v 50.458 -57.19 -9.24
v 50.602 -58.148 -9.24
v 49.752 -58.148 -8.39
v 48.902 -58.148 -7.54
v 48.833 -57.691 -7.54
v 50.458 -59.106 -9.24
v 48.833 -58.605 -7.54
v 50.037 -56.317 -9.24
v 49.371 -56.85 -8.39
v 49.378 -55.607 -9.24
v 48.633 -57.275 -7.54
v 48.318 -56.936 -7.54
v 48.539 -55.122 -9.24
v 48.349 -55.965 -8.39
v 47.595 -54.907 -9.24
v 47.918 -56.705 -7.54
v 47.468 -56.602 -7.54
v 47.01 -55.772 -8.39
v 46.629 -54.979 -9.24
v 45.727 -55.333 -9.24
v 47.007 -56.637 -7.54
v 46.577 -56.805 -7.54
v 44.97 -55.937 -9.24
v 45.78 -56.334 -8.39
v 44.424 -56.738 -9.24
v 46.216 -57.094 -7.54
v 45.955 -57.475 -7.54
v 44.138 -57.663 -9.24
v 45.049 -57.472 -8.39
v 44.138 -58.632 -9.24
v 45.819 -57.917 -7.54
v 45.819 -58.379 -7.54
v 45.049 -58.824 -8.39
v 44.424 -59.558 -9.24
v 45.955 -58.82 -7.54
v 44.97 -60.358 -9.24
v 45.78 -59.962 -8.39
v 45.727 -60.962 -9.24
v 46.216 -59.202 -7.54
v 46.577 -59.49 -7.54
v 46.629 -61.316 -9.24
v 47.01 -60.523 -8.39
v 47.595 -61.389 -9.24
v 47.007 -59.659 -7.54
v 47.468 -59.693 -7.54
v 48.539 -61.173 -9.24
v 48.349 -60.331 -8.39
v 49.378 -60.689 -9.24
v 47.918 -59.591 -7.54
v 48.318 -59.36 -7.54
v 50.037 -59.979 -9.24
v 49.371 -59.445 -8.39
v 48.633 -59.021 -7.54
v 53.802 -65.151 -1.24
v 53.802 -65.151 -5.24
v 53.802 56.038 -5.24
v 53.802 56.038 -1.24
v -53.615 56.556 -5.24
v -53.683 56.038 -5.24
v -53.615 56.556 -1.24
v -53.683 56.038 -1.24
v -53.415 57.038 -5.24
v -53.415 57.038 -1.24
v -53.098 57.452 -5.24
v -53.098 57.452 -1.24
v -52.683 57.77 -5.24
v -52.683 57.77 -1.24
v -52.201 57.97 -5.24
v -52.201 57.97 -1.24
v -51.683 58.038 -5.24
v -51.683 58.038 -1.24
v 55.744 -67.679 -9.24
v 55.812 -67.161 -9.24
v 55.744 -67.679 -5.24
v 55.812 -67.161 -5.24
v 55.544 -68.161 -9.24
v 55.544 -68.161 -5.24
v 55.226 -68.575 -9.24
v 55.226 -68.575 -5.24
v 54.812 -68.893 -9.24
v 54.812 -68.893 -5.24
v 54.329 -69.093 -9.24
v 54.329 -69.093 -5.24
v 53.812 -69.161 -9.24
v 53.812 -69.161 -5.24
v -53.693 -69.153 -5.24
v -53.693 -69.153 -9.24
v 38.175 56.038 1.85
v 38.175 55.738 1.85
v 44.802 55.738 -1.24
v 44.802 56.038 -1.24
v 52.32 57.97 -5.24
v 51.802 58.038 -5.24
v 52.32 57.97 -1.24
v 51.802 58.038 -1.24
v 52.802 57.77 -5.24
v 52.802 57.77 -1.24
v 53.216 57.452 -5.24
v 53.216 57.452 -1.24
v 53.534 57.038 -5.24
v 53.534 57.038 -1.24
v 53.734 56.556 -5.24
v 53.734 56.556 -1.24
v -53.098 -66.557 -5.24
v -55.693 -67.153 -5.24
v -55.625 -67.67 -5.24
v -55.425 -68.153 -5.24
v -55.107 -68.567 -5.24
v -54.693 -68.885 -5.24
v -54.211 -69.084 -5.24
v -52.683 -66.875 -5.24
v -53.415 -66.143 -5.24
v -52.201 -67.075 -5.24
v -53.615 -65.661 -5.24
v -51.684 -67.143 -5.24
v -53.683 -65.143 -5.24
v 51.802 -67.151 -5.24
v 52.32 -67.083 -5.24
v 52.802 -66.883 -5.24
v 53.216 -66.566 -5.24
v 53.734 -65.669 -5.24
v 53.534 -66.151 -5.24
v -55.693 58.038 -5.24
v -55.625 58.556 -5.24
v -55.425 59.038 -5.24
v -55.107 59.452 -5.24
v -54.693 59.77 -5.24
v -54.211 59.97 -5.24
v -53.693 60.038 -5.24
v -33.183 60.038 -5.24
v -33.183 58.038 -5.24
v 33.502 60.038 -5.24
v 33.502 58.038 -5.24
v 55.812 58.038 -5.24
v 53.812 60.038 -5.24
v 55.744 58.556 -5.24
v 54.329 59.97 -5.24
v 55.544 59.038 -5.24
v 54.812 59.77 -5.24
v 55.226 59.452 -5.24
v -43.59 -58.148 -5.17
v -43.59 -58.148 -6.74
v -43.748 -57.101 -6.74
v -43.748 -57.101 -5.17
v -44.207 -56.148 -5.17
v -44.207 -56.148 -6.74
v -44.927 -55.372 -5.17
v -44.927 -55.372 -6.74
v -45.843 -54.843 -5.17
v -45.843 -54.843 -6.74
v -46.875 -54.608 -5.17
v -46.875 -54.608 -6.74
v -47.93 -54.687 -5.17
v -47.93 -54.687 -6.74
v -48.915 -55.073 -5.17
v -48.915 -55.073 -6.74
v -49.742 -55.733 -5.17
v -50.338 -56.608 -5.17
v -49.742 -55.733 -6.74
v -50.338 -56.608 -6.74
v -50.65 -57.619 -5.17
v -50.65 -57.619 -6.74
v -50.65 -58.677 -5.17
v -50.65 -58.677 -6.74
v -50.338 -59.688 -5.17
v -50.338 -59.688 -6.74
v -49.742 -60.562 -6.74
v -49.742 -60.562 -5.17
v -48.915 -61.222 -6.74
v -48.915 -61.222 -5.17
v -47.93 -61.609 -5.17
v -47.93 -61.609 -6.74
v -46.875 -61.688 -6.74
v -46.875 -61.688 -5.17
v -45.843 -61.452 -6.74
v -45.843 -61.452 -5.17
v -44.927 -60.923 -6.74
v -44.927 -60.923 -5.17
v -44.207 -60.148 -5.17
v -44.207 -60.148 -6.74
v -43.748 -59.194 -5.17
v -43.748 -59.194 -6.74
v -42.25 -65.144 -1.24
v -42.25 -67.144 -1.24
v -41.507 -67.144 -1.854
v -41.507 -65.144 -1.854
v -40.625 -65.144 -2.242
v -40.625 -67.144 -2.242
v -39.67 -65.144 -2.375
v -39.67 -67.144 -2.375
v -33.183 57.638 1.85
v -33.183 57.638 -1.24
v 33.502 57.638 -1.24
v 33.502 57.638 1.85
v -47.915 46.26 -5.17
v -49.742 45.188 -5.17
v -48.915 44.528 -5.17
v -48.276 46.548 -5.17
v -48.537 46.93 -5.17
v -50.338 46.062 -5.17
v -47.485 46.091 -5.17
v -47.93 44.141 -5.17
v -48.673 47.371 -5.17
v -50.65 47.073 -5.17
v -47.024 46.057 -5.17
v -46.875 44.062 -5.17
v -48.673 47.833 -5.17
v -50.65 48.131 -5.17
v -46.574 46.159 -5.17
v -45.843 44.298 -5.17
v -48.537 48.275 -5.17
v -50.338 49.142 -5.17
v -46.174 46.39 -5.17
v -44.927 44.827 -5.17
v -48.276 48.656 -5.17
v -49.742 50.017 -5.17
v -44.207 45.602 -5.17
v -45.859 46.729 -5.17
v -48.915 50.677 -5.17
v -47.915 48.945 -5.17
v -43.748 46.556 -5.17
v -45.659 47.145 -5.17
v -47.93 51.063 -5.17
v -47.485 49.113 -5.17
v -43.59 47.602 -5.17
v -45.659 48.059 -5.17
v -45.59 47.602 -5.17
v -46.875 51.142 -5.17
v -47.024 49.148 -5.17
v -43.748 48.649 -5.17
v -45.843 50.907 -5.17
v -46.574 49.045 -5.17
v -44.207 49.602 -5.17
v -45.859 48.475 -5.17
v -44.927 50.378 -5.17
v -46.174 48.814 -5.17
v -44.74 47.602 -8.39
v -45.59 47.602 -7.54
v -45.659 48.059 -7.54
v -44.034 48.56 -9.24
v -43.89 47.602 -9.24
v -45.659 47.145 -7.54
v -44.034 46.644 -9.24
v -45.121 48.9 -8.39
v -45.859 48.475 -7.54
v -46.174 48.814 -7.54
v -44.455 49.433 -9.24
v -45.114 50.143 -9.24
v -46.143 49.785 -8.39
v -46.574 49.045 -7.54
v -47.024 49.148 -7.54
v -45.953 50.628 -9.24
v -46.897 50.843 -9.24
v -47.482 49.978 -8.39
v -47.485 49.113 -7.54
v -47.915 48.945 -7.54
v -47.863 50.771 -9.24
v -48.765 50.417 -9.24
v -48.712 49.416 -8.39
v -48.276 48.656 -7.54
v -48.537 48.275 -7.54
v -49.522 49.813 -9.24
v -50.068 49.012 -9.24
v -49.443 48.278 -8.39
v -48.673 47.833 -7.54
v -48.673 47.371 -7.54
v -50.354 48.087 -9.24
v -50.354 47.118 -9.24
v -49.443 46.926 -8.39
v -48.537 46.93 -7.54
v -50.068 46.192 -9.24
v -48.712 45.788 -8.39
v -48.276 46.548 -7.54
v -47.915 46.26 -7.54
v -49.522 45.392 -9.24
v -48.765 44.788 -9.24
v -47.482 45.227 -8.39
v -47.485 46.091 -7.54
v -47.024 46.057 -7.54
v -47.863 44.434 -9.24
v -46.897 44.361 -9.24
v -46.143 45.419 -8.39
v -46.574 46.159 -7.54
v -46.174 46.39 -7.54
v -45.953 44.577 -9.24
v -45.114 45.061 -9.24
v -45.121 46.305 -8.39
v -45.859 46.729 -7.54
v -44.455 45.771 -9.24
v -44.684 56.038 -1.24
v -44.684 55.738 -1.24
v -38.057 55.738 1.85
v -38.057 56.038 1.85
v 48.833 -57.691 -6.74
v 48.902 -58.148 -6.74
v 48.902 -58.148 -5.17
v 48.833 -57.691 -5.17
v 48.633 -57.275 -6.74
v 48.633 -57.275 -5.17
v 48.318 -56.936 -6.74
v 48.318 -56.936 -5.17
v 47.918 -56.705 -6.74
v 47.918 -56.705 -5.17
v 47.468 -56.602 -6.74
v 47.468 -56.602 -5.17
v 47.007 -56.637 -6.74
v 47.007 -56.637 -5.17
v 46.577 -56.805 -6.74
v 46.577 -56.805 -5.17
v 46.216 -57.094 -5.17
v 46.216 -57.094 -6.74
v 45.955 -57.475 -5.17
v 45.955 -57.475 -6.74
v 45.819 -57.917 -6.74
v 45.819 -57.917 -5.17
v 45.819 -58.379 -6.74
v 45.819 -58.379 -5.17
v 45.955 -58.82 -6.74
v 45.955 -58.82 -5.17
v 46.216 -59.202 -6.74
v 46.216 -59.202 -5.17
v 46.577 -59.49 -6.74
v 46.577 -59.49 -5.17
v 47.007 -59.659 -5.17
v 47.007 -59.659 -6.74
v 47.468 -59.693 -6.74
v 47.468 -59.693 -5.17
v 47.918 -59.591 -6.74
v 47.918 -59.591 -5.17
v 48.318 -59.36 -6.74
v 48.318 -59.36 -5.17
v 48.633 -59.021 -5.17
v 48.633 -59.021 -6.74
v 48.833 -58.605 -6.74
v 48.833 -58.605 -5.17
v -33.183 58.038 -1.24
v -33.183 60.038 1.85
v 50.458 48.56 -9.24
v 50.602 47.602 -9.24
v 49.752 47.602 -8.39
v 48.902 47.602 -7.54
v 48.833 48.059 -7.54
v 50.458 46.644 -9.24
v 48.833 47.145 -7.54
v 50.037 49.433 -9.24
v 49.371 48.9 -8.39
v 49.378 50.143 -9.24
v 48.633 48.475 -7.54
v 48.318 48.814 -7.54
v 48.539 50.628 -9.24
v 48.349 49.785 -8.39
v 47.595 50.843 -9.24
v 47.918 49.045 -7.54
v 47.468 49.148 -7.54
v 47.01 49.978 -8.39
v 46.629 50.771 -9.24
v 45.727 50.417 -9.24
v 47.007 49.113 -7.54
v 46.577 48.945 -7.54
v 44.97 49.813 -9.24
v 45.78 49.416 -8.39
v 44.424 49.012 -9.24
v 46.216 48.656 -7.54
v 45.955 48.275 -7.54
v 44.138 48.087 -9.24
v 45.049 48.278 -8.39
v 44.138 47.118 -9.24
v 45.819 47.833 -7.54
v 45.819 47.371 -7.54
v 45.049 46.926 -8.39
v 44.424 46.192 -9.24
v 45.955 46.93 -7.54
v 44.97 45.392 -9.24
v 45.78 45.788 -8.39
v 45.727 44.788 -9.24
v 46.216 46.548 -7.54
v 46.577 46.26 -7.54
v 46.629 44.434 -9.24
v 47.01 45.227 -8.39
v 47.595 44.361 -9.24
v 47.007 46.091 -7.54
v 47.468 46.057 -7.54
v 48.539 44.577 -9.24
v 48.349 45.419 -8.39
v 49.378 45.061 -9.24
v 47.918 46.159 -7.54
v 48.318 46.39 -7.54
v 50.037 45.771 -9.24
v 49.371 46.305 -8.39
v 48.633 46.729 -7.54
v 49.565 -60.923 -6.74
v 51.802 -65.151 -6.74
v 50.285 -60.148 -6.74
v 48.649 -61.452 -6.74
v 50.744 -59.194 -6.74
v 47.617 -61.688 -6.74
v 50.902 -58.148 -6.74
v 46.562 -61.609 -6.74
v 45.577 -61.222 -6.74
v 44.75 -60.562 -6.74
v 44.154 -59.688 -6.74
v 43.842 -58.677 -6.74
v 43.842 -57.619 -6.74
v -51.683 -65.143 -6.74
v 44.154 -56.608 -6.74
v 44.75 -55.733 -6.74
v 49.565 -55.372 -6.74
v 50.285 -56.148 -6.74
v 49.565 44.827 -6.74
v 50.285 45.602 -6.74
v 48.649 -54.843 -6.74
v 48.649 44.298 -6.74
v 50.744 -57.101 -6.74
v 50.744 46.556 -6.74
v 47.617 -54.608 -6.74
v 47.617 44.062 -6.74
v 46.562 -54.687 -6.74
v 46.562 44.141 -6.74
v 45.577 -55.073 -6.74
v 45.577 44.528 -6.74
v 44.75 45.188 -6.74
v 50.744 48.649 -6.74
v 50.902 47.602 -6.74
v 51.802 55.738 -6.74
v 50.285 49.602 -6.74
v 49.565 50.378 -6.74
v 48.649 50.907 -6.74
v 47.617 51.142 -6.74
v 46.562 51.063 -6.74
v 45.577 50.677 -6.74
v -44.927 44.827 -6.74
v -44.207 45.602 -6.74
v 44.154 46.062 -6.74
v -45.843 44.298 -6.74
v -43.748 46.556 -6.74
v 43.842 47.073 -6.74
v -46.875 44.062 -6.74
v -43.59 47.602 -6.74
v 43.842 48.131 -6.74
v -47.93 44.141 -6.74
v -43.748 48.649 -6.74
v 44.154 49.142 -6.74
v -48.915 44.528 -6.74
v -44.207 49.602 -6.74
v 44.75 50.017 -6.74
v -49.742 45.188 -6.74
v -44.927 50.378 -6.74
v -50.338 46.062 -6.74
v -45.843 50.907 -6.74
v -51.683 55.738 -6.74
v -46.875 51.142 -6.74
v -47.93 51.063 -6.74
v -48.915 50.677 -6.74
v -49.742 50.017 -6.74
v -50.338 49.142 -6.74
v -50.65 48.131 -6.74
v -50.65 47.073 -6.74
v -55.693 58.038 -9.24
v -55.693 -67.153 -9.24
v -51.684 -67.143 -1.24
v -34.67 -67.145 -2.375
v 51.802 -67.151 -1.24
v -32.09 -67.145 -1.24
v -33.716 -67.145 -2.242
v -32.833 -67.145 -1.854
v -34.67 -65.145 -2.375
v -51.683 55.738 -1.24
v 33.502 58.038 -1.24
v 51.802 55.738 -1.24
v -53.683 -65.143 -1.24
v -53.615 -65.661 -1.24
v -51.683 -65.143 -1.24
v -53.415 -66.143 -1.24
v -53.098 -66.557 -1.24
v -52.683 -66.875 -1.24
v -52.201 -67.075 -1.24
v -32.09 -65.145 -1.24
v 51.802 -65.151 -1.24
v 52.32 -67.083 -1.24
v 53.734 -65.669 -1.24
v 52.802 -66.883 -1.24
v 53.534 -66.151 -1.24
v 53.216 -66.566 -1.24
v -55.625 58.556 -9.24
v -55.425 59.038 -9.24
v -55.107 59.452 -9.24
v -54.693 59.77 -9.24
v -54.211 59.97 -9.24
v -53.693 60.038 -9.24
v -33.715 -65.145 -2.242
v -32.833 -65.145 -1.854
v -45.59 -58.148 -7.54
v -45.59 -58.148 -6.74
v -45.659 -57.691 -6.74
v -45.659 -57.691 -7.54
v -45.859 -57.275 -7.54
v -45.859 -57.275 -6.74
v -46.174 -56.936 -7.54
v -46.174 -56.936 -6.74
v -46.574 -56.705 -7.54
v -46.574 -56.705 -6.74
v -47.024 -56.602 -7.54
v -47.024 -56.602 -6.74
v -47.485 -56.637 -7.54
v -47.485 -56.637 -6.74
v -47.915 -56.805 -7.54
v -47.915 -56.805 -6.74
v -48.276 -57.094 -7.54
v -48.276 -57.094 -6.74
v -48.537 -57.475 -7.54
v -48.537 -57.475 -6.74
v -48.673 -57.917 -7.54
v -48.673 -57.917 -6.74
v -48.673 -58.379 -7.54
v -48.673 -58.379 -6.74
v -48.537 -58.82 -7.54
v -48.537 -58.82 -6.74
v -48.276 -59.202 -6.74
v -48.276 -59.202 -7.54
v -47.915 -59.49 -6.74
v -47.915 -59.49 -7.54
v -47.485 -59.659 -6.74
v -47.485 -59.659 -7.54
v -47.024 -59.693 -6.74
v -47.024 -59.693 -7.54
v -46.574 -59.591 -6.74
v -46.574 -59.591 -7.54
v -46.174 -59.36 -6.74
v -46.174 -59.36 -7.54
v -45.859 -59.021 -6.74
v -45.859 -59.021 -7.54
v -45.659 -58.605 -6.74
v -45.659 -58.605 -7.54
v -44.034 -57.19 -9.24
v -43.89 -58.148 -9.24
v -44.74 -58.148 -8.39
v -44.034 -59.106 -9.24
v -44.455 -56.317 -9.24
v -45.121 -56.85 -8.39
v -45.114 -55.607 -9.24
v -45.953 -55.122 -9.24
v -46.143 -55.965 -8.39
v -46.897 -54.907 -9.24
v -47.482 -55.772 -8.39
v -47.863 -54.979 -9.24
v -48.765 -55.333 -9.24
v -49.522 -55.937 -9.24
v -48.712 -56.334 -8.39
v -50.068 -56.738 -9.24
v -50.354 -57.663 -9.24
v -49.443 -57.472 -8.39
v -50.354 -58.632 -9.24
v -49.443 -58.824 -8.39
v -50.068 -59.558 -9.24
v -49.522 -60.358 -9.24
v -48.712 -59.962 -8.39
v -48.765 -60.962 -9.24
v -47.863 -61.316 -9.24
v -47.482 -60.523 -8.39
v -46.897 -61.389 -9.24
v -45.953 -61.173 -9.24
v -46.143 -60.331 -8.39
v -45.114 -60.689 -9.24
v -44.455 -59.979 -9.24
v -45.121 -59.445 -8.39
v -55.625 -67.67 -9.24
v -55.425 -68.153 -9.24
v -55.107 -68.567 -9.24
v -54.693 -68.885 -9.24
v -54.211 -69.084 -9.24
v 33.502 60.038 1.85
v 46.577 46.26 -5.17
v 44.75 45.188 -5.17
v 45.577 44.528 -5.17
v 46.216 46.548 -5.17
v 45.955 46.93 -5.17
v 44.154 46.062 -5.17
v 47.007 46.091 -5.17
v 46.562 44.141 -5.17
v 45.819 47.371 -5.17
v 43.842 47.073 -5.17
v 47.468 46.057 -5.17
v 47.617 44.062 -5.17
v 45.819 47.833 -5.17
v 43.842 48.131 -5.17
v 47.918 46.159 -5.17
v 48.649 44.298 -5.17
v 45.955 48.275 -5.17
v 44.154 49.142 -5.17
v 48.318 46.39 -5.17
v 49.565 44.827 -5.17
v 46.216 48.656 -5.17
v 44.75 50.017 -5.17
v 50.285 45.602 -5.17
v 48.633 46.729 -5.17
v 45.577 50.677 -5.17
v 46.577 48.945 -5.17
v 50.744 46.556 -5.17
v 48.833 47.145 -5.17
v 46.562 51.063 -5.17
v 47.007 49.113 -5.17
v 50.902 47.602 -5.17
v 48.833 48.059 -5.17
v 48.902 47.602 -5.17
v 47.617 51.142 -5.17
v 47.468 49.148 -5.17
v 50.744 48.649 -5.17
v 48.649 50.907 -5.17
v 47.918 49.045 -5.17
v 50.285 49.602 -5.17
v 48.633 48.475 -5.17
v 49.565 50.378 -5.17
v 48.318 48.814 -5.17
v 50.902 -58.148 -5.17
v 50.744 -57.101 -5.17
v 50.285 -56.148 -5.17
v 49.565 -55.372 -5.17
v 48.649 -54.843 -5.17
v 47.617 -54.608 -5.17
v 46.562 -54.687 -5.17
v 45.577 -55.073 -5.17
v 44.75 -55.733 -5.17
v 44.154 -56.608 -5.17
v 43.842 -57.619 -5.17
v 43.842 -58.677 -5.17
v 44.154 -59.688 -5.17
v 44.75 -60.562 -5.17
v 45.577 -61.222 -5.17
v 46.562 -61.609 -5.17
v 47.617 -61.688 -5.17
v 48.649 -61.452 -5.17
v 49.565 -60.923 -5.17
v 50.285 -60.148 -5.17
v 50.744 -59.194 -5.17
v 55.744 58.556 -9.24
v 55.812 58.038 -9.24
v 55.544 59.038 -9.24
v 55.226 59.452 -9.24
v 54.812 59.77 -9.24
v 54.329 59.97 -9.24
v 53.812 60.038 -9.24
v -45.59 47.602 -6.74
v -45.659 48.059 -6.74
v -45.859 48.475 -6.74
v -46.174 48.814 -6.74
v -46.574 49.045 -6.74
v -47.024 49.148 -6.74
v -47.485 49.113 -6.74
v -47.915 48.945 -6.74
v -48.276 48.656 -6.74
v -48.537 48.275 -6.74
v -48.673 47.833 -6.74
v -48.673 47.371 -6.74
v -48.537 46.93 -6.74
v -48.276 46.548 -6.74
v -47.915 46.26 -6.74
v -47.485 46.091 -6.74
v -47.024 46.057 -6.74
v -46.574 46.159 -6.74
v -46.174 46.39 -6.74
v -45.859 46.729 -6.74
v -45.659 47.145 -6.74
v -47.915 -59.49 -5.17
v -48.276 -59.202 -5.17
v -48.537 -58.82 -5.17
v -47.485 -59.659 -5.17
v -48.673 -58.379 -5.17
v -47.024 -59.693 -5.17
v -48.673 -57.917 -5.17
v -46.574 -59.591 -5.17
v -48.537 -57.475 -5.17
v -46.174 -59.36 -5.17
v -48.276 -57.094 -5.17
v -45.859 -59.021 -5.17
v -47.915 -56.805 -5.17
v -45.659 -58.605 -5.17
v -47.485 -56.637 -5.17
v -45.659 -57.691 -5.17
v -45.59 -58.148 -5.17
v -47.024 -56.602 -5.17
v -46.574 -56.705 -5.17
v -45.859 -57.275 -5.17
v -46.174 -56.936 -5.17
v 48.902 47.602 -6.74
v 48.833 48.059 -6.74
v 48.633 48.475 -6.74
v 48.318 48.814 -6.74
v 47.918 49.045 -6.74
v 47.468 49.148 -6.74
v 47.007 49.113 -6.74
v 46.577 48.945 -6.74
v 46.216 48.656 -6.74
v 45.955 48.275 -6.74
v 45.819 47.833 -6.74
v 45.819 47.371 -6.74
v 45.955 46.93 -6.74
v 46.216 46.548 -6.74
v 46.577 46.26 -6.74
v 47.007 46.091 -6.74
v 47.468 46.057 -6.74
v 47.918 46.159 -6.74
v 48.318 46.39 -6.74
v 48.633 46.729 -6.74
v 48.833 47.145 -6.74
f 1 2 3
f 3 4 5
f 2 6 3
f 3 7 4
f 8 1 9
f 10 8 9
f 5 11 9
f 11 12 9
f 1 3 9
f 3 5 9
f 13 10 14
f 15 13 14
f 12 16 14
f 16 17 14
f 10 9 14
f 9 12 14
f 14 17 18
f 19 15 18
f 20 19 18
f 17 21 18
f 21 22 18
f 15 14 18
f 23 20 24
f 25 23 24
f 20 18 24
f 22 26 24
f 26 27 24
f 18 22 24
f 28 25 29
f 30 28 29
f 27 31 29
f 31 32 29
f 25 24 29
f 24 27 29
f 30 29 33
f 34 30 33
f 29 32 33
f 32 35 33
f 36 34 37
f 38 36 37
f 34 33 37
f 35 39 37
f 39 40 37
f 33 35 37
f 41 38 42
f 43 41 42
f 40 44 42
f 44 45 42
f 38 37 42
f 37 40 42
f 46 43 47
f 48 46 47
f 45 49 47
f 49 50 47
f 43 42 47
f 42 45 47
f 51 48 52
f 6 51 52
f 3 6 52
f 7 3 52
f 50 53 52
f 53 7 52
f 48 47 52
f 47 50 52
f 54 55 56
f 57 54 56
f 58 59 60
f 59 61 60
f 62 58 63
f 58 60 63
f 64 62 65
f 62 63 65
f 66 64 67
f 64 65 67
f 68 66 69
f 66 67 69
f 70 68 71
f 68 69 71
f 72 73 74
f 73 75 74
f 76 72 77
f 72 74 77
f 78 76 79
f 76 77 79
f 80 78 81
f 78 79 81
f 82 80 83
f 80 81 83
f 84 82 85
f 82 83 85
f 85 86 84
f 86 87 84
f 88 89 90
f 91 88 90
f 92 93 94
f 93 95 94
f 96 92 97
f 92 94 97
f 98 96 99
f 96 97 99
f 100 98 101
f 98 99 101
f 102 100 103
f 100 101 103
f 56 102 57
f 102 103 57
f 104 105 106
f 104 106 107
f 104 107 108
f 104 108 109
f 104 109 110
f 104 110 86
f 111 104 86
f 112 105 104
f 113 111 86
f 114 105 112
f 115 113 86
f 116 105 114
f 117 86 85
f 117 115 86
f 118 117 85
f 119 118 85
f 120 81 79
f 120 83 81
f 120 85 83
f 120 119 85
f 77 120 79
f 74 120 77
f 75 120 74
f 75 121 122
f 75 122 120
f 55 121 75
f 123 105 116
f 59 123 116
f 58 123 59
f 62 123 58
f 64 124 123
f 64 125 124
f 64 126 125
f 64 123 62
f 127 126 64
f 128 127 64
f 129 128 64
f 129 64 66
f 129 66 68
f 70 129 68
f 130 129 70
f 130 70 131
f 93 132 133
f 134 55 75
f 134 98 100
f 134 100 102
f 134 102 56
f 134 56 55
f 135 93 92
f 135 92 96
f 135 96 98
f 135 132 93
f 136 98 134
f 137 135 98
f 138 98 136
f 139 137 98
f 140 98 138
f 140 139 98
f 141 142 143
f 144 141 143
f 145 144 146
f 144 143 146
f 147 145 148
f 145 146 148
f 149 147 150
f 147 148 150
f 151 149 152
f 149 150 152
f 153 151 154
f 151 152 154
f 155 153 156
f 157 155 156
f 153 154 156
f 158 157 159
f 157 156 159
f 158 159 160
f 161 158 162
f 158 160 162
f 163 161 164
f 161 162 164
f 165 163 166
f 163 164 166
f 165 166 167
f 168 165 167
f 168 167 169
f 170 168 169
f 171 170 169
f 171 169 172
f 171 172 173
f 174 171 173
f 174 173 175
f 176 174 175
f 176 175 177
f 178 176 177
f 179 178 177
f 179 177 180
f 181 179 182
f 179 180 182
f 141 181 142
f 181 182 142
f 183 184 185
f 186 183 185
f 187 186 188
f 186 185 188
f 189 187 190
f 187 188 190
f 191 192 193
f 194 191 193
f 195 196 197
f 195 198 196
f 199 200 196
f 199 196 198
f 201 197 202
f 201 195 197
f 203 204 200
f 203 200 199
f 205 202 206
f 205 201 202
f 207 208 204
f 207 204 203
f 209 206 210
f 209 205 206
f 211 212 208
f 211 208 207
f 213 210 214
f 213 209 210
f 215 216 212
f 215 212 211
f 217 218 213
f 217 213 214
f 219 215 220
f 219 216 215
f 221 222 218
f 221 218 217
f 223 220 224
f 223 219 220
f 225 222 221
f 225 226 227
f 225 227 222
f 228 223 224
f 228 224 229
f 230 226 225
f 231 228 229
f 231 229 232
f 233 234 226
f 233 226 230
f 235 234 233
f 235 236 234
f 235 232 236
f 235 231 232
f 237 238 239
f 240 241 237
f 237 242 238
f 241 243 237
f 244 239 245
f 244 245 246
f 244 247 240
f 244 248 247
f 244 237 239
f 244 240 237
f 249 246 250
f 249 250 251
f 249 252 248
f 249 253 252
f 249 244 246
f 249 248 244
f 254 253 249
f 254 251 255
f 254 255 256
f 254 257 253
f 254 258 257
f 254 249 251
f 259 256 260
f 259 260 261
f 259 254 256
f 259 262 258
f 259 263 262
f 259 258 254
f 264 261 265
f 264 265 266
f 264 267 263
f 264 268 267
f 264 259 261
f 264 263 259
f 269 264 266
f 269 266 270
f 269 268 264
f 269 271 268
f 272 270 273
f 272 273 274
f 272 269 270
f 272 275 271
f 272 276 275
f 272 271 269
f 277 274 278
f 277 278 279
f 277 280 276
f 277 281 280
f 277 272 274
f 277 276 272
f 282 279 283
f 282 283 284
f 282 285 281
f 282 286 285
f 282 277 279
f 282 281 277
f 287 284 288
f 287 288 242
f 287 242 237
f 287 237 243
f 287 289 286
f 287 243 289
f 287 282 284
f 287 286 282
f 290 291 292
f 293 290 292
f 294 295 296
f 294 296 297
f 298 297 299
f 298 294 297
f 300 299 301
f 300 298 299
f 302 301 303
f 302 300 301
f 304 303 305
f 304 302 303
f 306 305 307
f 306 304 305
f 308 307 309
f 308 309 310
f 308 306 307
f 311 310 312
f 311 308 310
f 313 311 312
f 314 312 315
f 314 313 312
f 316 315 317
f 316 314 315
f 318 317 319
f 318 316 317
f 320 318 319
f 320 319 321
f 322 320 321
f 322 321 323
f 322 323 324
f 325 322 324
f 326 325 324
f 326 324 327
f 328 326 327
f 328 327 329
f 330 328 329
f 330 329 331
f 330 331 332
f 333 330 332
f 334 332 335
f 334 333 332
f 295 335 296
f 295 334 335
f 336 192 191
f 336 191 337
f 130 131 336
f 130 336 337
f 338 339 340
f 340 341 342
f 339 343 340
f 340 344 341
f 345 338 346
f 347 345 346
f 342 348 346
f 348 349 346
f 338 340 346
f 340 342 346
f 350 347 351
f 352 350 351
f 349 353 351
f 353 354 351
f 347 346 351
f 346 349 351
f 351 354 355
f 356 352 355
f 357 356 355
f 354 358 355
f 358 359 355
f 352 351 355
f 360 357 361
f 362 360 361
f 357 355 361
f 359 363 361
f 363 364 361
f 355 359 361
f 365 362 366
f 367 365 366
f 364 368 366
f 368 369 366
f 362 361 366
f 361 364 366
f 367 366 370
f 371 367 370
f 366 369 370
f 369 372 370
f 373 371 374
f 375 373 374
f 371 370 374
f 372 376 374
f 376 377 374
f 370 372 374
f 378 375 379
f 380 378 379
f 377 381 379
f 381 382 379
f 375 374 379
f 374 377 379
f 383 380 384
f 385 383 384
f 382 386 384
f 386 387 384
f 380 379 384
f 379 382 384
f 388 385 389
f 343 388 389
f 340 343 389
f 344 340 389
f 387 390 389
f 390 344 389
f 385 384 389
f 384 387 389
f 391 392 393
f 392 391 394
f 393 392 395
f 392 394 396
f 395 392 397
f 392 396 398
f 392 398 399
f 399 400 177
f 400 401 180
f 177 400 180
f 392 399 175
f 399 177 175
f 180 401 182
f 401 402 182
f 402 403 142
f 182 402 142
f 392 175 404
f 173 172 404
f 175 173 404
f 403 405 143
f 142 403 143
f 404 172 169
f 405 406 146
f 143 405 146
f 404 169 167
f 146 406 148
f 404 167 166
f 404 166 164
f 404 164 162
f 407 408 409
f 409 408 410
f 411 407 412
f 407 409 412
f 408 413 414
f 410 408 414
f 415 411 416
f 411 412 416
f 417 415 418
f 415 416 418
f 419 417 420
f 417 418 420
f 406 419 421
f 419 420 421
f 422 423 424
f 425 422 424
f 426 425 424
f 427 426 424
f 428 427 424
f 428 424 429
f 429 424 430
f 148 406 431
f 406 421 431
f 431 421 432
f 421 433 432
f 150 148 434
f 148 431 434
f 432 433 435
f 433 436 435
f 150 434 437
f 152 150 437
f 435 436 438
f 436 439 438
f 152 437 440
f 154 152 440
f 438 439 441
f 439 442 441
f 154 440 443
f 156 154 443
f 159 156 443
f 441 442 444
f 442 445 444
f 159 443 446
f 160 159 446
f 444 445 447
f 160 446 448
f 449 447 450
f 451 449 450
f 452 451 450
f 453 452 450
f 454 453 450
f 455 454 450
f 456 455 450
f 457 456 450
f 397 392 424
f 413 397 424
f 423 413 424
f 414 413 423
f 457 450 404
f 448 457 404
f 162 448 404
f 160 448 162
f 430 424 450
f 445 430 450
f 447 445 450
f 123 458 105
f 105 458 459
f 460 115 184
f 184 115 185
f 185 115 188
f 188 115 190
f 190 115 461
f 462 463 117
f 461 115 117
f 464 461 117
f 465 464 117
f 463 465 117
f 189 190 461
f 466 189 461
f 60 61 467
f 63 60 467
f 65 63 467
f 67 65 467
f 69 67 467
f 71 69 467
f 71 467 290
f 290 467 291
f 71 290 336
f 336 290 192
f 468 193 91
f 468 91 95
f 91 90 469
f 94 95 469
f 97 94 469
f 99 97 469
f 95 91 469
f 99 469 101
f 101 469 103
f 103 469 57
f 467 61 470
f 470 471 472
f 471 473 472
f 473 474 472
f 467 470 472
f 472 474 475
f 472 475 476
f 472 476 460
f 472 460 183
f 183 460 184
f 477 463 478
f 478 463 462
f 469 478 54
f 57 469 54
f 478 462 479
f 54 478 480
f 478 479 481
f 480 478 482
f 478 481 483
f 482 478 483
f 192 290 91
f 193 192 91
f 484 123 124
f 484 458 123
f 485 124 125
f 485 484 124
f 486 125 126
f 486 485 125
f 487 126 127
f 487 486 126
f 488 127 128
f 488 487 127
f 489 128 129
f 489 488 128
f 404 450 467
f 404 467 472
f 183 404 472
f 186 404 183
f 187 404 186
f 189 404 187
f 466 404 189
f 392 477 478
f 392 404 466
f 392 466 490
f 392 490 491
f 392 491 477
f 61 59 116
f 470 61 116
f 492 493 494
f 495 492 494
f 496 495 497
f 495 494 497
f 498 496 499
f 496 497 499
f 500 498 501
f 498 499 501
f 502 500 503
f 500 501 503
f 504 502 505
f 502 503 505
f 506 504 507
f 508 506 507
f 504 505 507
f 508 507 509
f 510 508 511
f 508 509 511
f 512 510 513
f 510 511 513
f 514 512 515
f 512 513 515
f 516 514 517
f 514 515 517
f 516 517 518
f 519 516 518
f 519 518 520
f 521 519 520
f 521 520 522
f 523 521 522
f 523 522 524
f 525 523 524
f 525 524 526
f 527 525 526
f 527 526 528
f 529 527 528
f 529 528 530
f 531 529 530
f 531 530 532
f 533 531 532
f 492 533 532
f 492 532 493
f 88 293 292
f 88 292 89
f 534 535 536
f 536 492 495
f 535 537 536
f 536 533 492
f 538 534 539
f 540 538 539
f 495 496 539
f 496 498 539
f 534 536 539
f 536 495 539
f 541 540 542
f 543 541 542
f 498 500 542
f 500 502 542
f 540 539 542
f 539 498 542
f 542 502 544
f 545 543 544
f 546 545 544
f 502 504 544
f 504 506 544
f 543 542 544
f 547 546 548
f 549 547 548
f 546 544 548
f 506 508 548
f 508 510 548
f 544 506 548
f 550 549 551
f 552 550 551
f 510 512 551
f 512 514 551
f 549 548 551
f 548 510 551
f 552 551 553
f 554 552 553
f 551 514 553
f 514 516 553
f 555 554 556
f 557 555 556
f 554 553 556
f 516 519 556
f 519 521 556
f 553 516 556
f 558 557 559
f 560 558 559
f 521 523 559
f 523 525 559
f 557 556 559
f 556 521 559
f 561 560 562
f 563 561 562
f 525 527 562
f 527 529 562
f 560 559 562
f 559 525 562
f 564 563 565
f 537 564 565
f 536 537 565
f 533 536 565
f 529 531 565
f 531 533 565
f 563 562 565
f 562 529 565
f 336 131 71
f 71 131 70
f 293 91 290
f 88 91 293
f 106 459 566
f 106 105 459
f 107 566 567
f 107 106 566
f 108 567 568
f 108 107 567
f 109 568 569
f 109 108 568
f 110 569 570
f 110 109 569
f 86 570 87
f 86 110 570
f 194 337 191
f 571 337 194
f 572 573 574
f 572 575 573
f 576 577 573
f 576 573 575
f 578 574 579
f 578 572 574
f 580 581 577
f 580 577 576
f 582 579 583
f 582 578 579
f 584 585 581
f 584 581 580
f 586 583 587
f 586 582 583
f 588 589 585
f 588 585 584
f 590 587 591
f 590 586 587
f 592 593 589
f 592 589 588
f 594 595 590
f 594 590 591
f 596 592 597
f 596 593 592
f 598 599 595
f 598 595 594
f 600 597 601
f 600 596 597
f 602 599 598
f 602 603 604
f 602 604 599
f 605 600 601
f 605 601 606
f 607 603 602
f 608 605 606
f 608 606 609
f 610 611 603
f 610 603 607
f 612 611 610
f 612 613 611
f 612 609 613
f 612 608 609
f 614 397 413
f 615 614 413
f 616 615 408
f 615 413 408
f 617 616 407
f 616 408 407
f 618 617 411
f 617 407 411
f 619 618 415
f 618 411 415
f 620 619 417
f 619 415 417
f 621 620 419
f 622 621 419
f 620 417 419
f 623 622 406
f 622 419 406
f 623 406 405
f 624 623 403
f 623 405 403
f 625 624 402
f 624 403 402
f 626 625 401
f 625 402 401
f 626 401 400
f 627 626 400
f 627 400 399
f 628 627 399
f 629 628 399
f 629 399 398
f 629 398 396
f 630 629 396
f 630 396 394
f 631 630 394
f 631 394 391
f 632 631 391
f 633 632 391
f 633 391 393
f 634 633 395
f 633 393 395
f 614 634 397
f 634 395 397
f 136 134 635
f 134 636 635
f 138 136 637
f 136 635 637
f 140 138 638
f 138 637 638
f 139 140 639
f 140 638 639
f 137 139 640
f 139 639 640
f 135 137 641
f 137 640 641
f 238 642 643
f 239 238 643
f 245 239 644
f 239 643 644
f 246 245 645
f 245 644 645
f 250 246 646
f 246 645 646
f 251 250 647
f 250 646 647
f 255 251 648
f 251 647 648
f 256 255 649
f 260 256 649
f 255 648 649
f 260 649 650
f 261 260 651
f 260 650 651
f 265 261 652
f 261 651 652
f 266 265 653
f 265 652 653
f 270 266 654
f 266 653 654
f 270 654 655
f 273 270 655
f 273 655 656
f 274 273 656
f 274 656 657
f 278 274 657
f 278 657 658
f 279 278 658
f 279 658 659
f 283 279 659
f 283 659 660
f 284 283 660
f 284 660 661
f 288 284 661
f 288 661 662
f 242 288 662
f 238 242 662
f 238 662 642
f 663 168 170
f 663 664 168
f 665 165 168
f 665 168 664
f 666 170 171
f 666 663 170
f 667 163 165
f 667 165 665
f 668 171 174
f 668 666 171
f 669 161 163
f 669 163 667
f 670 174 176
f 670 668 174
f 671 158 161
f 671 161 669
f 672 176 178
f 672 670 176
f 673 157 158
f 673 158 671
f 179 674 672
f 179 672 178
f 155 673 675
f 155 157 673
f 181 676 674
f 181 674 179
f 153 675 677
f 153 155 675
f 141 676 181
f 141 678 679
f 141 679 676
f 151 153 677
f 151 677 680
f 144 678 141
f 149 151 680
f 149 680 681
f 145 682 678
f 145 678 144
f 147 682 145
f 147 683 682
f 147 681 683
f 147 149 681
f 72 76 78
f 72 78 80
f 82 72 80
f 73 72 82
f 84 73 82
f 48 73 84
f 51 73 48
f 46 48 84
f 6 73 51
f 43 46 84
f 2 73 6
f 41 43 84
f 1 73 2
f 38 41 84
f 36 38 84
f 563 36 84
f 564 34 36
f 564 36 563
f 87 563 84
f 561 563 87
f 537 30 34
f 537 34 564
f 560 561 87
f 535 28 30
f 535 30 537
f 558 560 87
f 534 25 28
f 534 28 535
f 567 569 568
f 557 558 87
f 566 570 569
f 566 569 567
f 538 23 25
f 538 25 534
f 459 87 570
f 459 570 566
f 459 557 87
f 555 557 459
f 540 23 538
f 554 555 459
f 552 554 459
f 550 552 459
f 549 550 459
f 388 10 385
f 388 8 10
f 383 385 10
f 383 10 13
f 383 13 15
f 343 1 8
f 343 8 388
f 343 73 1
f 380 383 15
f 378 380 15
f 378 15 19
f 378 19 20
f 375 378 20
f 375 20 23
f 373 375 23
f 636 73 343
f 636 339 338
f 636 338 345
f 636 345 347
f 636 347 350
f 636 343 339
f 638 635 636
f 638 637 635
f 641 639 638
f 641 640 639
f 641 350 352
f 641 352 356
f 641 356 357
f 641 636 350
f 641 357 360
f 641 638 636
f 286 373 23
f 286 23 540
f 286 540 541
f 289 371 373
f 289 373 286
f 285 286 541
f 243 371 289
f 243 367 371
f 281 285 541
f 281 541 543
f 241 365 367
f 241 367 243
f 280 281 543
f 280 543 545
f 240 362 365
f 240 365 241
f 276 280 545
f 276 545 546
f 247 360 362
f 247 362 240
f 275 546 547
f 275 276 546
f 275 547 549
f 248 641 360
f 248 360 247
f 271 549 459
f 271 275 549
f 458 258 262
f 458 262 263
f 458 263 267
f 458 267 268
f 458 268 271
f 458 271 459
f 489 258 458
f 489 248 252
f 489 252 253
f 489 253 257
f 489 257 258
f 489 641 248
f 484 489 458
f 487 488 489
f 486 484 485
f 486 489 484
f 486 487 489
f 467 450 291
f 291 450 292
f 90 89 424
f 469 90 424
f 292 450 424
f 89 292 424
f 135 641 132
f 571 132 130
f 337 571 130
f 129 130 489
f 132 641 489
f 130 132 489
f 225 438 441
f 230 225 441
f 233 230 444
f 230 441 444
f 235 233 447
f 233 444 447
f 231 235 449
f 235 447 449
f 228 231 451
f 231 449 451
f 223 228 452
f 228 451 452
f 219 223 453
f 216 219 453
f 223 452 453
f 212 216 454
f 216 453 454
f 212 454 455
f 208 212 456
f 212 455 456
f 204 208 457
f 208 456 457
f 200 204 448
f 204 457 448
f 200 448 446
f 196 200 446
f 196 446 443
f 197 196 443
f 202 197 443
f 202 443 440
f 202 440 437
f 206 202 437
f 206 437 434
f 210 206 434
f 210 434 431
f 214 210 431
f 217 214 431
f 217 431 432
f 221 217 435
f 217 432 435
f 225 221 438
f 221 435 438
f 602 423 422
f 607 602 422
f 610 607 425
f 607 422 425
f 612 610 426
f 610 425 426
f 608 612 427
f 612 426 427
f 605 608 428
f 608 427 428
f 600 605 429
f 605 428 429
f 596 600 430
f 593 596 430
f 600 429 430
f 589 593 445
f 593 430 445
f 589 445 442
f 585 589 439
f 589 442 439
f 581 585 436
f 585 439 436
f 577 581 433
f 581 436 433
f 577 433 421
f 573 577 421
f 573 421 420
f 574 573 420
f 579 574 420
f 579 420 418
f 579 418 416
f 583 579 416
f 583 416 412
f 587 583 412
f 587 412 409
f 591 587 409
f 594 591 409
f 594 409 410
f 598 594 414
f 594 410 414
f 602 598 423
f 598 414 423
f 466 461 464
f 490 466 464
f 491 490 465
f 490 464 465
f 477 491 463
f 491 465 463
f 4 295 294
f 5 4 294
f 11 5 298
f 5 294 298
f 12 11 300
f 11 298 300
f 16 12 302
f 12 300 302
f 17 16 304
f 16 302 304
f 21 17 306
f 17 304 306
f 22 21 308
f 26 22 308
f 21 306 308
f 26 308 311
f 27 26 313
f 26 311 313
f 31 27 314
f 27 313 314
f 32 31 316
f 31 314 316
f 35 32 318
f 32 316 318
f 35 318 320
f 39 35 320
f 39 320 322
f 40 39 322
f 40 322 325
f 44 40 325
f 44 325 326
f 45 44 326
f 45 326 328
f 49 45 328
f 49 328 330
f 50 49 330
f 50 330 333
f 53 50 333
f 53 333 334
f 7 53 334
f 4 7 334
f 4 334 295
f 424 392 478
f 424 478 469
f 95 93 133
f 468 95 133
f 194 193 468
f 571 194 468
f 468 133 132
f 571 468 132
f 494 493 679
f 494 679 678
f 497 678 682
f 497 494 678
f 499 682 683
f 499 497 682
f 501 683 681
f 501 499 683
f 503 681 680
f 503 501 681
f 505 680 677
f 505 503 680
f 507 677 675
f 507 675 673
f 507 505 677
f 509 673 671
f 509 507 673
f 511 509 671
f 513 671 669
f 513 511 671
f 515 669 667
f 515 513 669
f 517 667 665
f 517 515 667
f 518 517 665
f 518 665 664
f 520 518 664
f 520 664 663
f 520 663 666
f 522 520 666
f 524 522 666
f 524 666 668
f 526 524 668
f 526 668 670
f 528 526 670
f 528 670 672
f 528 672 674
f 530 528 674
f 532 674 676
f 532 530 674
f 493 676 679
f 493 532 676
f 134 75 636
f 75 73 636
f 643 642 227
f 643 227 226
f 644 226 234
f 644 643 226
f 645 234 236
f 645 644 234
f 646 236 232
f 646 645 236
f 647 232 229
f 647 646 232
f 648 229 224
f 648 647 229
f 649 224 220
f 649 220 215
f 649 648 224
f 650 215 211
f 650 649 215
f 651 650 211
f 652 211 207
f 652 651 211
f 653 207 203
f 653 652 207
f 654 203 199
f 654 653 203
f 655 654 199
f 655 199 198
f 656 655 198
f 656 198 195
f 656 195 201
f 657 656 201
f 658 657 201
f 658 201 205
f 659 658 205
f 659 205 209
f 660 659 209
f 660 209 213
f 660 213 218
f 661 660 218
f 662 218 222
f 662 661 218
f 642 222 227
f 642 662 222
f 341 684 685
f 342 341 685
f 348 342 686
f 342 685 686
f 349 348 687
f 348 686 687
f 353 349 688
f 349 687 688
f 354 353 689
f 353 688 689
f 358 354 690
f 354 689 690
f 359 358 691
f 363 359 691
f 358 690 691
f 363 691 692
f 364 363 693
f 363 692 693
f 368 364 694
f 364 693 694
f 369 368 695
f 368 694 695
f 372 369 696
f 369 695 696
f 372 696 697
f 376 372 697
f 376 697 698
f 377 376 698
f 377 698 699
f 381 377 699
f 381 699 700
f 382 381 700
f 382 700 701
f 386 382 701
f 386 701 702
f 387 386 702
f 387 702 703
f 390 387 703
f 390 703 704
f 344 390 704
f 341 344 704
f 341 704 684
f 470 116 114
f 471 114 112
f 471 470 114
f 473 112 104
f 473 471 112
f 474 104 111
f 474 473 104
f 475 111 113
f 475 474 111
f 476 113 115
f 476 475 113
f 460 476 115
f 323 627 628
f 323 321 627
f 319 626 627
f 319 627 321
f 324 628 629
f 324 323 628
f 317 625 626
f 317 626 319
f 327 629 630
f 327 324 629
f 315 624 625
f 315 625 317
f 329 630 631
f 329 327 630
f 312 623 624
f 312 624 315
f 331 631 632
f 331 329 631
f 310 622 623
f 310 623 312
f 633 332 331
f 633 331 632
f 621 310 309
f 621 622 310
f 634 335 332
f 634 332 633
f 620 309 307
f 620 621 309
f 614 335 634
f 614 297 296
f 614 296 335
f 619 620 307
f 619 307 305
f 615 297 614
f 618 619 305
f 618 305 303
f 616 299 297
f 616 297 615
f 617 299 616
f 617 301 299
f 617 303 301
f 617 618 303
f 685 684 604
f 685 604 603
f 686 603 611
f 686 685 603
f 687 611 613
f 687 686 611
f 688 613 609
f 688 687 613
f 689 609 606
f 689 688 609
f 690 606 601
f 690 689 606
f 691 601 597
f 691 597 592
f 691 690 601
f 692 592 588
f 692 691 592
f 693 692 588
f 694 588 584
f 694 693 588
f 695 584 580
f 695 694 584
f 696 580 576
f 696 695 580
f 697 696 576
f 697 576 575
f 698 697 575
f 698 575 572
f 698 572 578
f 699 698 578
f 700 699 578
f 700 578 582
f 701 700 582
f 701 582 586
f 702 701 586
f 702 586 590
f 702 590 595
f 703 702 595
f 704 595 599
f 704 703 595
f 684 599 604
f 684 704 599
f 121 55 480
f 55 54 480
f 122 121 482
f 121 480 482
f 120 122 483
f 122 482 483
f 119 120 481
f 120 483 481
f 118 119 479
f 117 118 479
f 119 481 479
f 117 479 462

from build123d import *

# Parameters (mm, degrees)
DODANIE_WYCI_GNI_CIE1_DEPTH      = 0.5
DODANIE_WYCI_GNI_CIE1_DEPTH_BACK = 2
DODANIE_WYCI_GNI_CIE2_DEPTH      = 5.5
DODANIE_WYCI_GNI_CIE3_DEPTH      = 1.5
ZAOKR_GLENIE1_R                  = 2
SZKIC6_W                         = 66.685530181
SZKIC6_H                         = 2.4
DODANIE_WYCI_GNI_CIE4_DEPTH      = 8.59
DODANIE_WYCI_GNI_CIE5_DEPTH      = 8.59
WYTNIJ_WYCI_GNI_CIE1_DEPTH       = 5.5
SZKIC13_R                        = 3.55
SZKIC13_R_2                      = 1.6
SZKIC13_R_3                      = 1.55
DODANIE_WYCI_GNI_CIE7_DEPTH      = 1.57
SZKIC13_3_R                      = 1.55
WYTNIJ_WYCI_GNI_CIE2_DEPTH       = 90.285917207
WYTNIJ_WYCI_GNI_CIE3_DEPTH       = 2
SFAZOWANIE1_SIZE                 = 1.7


with BuildPart() as part:
    # Szkic3 → Dodanie-wyciągnięcie1 (new, two sides: drawn at the far end of the back side and taken through both)
    with BuildSketch(Plane(origin=(0, 0, -8.74), x_dir=(-1, 0, 0), z_dir=(0, 0, -1)).offset(-DODANIE_WYCI_GNI_CIE1_DEPTH_BACK)):
        Polygon((55.692889856, -69.15246634), (55.692892168, 60.038263946), (-55.811722529, 60.038263946), (-55.811687853, -69.161116694), align=None)
    extrude(amount=DODANIE_WYCI_GNI_CIE1_DEPTH + DODANIE_WYCI_GNI_CIE1_DEPTH_BACK)

    # Szkic4 → Dodanie-wyciągnięcie2 (add)
    with BuildSketch(Plane.XY.offset(-6.74)):
        Polygon((53.802147291, -67.151419689), (53.80218089, 58.038263946), (-53.683348754, 58.038263946), (-53.683348754, -67.143081129), align=None)
        Polygon((51.802147827, -65.151264526), (51.802180354, 56.038263946), (-51.683348754, 56.038263946), (-51.683348754, -65.14323628), align=None, mode=Mode.SUBTRACT)
    extrude(amount=DODANIE_WYCI_GNI_CIE2_DEPTH)

    # Szkic4<3> → Dodanie-wyciągnięcie3 (add)
    with BuildSketch(Plane.XY.offset(-6.74)):
        Polygon((-55.692892168, 60.038263946), (-55.692889856, -69.15246634), (55.811687853, -69.161116694), (55.811722529, 60.038263946), align=None)
        Polygon((-53.683348754, -67.143081129), (-53.683348754, 58.038263946), (53.80218089, 58.038263946), (53.802147291, -67.151419689), align=None, mode=Mode.SUBTRACT)
    extrude(amount=DODANIE_WYCI_GNI_CIE3_DEPTH)

    # Zaokrąglenie1
    zaokr_glenie1_edges = [part.edges().sort_by_distance(p)[0] for p in [
        (53.80218089, 58.038263946, -3.24),
        (-53.683348754, 58.038263946, -3.24),
        (-53.683348754, -67.143081129, -3.24),
        (53.802147291, -67.151419689, -3.24),
        (55.811687853, -69.161116694, -7.24),
        (55.811722529, 60.038263946, -7.24),
        (-55.692892168, 60.038263946, -7.24),
        (-55.692889856, -69.15246634, -7.24),
    ]]
    fillet(zaokr_glenie1_edges, radius=ZAOKR_GLENIE1_R)

    # Szkic6 → Dodanie-wyciągnięcie4 (add)
    with BuildSketch(Plane.XY.offset(-6.74)):
        with Locations((0.159416337, 58.838263946)):
            Rectangle(SZKIC6_W, SZKIC6_H)
    extrude(amount=DODANIE_WYCI_GNI_CIE4_DEPTH)

    # Szkic7 → Dodanie-wyciągnięcie5 (add)
    with BuildSketch(Plane.XY.offset(-6.74)):
        Polygon((-51.683348754, 55.738263946), (51.802180273, 55.738263946), (51.802180354, 56.038263946), (-51.683348754, 56.038263946), align=None)
    extrude(amount=DODANIE_WYCI_GNI_CIE5_DEPTH)

    # Szkic9 → Wytnij-wyciągnięcie1 (cut)
    with BuildSketch(Plane.XZ.offset(-55.738263946)):
        Polygon((51.802180273, 1.85), (38.175466286, 1.85), (44.80199267, -1.24), (51.80199267, -1.24), (51.802180273, -1.24), align=None)
        Polygon((-38.056977527, 1.85), (-51.683348754, 1.85), (-51.683348754, -1.24), (-44.683503911, -1.24), align=None)
    extrude(amount=-WYTNIJ_WYCI_GNI_CIE1_DEPTH, mode=Mode.SUBTRACT)

    # Szkic13 → Dodanie-wyciągnięcie7 (add)
    # profile 1 of 8: a face of its own
    with BuildSketch(Plane.XY.offset(-6.74)):
        with Locations((-47.14, 47.6022)):
            Circle(SZKIC13_R)
        with Locations((-47.14, 47.6022)):
            Circle(SZKIC13_R_2, mode=Mode.SUBTRACT)
    # profile 2 of 8: a face of its own
    with BuildSketch(Plane.XY.offset(-6.74)):
        with Locations((-47.14, 47.6022)):
            Circle(SZKIC13_R_2)
        with Locations((-47.14, 47.6022)):
            Circle(SZKIC13_R_3, mode=Mode.SUBTRACT)
    # profile 3 of 8: a face of its own
    with BuildSketch(Plane.XY.offset(-6.74)):
        with Locations((47.352, 47.6022)):
            Circle(SZKIC13_R)
        with Locations((47.352, 47.6022)):
            Circle(SZKIC13_R_2, mode=Mode.SUBTRACT)
    # profile 4 of 8: a face of its own
    with BuildSketch(Plane.XY.offset(-6.74)):
        with Locations((47.352, 47.6022)):
            Circle(SZKIC13_R_2)
        with Locations((47.352, 47.6022)):
            Circle(SZKIC13_R_3, mode=Mode.SUBTRACT)
    # profile 5 of 8: a face of its own
    with BuildSketch(Plane.XY.offset(-6.74)):
        with Locations((-47.14, -58.1478)):
            Circle(SZKIC13_R)
        with Locations((-47.14, -58.1478)):
            Circle(SZKIC13_R_2, mode=Mode.SUBTRACT)
    # profile 6 of 8: a face of its own
    with BuildSketch(Plane.XY.offset(-6.74)):
        with Locations((-47.14, -58.1478)):
            Circle(SZKIC13_R_2)
        with Locations((-47.14, -58.1478)):
            Circle(SZKIC13_R_3, mode=Mode.SUBTRACT)
    # profile 7 of 8: a face of its own
    with BuildSketch(Plane.XY.offset(-6.74)):
        with Locations((47.352, -58.1478)):
            Circle(SZKIC13_R)
        with Locations((47.352, -58.1478)):
            Circle(SZKIC13_R_2, mode=Mode.SUBTRACT)
    # profile 8 of 8: a face of its own
    with BuildSketch(Plane.XY.offset(-6.74)):
        with Locations((47.352, -58.1478)):
            Circle(SZKIC13_R_2)
        with Locations((47.352, -58.1478)):
            Circle(SZKIC13_R_3, mode=Mode.SUBTRACT)
    extrude(amount=DODANIE_WYCI_GNI_CIE7_DEPTH)

    # Szkic13<3> → Wytnij-wyciągnięcie2 (cut, through all)
    with BuildSketch(Plane.XY.offset(-6.74)):
        with Locations((-47.14, -58.1478)):
            Circle(SZKIC13_3_R)
        with Locations((-47.14, 47.6022)):
            Circle(SZKIC13_3_R)
        with Locations((47.352, 47.6022)):
            Circle(SZKIC13_3_R)
        with Locations((47.352, -58.1478)):
            Circle(SZKIC13_3_R)
    extrude(amount=-WYTNIJ_WYCI_GNI_CIE2_DEPTH, mode=Mode.SUBTRACT)

    # Szkic18 → Wytnij-wyciągnięcie3 (cut)
    with BuildSketch(Plane(origin=(-0.00520918, -67.147245397, 0), x_dir=(0.999999996990791, -7.757846392237927e-05, 0), z_dir=(-7.757846392237927e-05, -0.999999996990791, 0))):
        with BuildLine():
            ThreePointArc((-42.245261471, -1.24), (-41.074504923, -2.078778872), (-39.665102055, -2.375097025))
            Line((-39.665102055, -2.375097025), (-34.665098037, -2.375097025))
            ThreePointArc((-34.665098037, -2.375097025), (-33.255694971, -2.078778946), (-32.084938256, -1.24))
            Line((-32.084938256, -1.24), (-42.245261471, -1.24))
        make_face()
    extrude(amount=-WYTNIJ_WYCI_GNI_CIE3_DEPTH, mode=Mode.SUBTRACT)

    # Sfazowanie1
    sfazowanie1_edges = [part.edges().sort_by_distance(p)[0] for p in [
        (45.802, -58.1478, -9.24),
        (45.802, 47.6022, -9.24),
        (-48.69, 47.6022, -9.24),
        (-48.69, -58.1478, -9.24),
    ]]
    chamfer(sfazowanie1_edges, length=SFAZOWANIE1_SIZE)


solid = part.part
